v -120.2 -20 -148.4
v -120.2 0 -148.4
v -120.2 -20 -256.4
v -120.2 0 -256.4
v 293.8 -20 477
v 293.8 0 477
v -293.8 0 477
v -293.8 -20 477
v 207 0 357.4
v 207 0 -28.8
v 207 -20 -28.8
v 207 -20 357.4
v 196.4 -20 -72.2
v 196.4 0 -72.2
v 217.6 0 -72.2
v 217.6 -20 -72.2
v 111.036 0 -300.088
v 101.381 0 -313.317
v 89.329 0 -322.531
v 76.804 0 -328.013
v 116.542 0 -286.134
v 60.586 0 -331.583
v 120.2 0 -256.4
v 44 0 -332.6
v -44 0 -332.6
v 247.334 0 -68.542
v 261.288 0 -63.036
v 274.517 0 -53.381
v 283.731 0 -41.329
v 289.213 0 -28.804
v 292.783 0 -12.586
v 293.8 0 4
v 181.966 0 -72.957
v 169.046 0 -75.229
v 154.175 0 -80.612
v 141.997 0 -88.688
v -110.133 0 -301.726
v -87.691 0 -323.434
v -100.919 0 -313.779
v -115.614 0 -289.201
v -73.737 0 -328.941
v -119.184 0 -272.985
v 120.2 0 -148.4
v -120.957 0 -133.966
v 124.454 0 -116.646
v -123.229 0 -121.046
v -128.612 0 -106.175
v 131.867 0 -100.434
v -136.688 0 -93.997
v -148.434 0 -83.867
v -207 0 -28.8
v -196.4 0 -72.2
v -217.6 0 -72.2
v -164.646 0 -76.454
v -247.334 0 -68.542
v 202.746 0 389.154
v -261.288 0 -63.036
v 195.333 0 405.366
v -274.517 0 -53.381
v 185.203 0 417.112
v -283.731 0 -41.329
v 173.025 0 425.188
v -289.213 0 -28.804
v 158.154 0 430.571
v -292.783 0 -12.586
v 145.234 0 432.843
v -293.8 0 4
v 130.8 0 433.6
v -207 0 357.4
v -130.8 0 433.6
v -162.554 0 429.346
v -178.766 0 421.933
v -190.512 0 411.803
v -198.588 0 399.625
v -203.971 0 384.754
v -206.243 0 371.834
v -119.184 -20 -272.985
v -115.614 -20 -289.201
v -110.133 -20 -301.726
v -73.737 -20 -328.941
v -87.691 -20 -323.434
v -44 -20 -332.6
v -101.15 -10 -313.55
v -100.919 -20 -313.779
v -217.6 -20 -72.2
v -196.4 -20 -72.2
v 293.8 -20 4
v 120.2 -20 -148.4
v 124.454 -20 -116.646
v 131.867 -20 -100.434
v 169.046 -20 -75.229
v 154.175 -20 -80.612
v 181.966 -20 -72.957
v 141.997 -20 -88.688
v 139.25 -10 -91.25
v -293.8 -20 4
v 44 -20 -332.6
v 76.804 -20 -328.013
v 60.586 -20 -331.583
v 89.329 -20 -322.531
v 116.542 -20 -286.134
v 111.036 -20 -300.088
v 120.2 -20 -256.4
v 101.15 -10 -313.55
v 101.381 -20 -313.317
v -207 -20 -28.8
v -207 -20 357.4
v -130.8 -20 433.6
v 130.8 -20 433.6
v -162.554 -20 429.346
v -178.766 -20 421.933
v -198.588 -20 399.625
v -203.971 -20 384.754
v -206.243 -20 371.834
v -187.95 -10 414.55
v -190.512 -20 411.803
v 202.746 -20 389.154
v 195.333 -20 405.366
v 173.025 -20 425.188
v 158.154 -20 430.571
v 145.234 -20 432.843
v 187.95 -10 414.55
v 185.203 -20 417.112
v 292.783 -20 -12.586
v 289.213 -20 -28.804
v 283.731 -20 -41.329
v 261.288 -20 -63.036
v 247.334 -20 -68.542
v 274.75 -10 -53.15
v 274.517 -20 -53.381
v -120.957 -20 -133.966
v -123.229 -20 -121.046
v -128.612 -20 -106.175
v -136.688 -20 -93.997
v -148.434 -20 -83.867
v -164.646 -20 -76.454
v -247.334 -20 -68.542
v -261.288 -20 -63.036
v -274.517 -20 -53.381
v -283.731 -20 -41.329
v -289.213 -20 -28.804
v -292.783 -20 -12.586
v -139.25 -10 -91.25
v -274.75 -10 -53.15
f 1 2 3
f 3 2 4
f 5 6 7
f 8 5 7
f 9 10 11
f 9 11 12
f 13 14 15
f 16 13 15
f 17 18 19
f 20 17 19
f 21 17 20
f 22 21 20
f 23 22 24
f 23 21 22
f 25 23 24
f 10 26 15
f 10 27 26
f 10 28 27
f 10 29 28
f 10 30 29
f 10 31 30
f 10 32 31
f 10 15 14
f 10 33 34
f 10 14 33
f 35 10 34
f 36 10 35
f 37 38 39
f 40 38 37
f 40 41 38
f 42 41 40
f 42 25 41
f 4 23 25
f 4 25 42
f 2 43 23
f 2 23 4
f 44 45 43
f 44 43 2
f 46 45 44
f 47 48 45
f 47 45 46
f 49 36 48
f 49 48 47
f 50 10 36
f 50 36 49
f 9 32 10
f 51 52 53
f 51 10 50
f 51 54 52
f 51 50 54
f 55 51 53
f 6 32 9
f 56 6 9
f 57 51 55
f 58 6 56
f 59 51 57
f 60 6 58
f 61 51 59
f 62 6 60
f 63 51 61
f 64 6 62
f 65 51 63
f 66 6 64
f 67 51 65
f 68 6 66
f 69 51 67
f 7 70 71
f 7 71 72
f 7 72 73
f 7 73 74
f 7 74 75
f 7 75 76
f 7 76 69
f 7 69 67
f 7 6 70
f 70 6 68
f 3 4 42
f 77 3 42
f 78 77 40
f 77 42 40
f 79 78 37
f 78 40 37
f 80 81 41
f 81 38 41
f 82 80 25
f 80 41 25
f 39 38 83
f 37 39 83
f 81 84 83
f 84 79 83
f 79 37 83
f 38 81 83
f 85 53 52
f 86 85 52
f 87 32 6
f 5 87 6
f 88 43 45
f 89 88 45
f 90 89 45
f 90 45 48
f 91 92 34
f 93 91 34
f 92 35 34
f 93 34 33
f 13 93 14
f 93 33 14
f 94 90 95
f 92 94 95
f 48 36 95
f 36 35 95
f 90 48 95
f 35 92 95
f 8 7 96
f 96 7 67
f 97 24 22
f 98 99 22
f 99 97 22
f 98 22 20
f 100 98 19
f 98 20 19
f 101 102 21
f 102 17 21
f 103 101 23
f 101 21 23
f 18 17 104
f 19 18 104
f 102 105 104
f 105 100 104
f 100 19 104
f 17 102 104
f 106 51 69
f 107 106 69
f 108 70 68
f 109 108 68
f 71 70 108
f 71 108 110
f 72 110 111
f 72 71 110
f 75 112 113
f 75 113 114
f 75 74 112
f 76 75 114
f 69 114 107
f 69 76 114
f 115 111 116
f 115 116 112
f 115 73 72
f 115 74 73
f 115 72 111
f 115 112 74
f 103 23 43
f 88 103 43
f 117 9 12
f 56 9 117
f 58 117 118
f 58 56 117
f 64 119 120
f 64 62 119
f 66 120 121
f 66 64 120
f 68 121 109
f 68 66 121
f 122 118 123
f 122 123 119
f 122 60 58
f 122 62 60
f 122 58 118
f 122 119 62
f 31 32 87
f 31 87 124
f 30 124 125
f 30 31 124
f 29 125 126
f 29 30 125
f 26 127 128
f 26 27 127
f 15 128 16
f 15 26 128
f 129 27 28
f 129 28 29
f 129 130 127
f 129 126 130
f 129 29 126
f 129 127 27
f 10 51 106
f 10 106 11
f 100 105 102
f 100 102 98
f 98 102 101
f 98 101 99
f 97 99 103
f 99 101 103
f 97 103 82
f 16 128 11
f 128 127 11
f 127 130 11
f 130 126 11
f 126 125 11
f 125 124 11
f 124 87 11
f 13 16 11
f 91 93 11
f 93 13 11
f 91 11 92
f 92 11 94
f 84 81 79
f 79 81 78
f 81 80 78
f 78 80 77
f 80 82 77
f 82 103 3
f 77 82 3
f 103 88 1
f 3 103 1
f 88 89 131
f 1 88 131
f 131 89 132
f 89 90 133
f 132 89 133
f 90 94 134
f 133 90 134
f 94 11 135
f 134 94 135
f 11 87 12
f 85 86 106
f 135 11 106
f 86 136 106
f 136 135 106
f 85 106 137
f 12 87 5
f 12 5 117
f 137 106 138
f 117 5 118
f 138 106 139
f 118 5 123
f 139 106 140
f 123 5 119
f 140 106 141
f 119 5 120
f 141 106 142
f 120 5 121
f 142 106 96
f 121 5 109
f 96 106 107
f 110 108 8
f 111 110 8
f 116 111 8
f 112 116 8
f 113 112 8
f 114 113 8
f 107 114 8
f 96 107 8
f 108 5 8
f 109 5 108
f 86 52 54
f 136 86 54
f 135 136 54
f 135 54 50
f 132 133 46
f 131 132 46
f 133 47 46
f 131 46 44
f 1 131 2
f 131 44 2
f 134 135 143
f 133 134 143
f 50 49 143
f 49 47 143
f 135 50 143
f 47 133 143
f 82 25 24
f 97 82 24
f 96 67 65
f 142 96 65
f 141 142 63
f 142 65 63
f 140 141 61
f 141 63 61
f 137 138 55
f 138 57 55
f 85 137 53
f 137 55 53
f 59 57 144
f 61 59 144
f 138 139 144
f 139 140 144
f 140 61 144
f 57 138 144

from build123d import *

# Parameters (mm, degrees)
F1_DEPTH    = 20
F2_T1_DEPTH = 20
F2_T3_DEPTH = 401
F3_W        = 414
F3_H        = 462.4
F4_DEPTH    = 25.4
F5_T1_DEPTH = 20


# Not quite as in the source:
# - a fillet or chamfer that OpenCascade refuses, or shapes differently, is made with other operations: its cross-section is extruded or revolved along the edge and cut away or added


with BuildPart() as f1:
    # F0 (on Front) → F1 (new body)
    with BuildSketch(Plane.XZ):
        Polygon((293.8, 477), (-293.8, 477), (-293.8, -72.2), (-120.2, -72.2), (-120.2, -332.6), (120.2, -332.6), (120.2, -72.2), (293.8, -72.2), align=None)
    extrude(amount=F1_DEPTH)

    # F2: fillet of radius 76.2 on 6 edges, made by hand

    # F2_s2 → F2_t1 (join)
    with BuildSketch(Plane.XZ):
        with BuildLine():
            add(Edge.make_bspline(
                [(-196.4, -72.2), (-120.2, -72.2), (-120.2, -148.4)],
                knots=[0, 0, 0, 1, 1, 1], degree=2, weights=[1, 1, 1]))
            Line((-120.2, -148.4), (-120.2, -72.2))
            Line((-120.2, -72.2), (-196.4, -72.2))
        make_face()
        with BuildLine():
            add(Edge.make_bspline(
                [(120.2, -148.4), (120.2, -72.2), (196.4, -72.2)],
                knots=[0, 0, 0, 1, 1, 1], degree=2, weights=[1, 1, 1]))
            Line((196.4, -72.2), (120.2, -72.2))
            Line((120.2, -72.2), (120.2, -148.4))
        make_face()
    extrude(amount=F2_T1_DEPTH)

    # F2_s4 → F2_t3 (cut)
    with BuildSketch(Plane.XZ.offset(-190.5)):
        with BuildLine():
            add(Edge.make_bspline(
                [(-293.8, 4), (-293.8, -72.2), (-217.6, -72.2)],
                knots=[0, 0, 0, 1, 1, 1], degree=2, weights=[1, 1, 1]))
            Line((-217.6, -72.2), (-293.8, -72.2))
            Line((-293.8, -72.2), (-293.8, 4))
        make_face()
        with BuildLine():
            add(Edge.make_bspline(
                [(44, -332.6), (120.2, -332.6), (120.2, -256.4)],
                knots=[0, 0, 0, 1, 1, 1], degree=2, weights=[1, 1, 1]))
            Line((120.2, -256.4), (120.2, -332.6))
            Line((120.2, -332.6), (44, -332.6))
        make_face()
        with BuildLine():
            add(Edge.make_bspline(
                [(293.8, 4), (293.8, -72.2), (217.6, -72.2)],
                knots=[0, 0, 0, 1, 1, 1], degree=2, weights=[1, 1, 1]))
            Line((217.6, -72.2), (293.8, -72.2))
            Line((293.8, -72.2), (293.8, 4))
        make_face()
        with BuildLine():
            add(Edge.make_bspline(
                [(-120.2, -256.4), (-120.2, -332.6), (-44, -332.6)],
                knots=[0, 0, 0, 1, 1, 1], degree=2, weights=[1, 1, 1]))
            Line((-44, -332.6), (-120.2, -332.6))
            Line((-120.2, -332.6), (-120.2, -256.4))
        make_face()
    extrude(amount=F2_T3_DEPTH, mode=Mode.SUBTRACT)

    # F3 (on Front) → F4 (cut)
    with BuildSketch(Plane.XZ):
        with Locations((0, 202.4)):
            Rectangle(F3_W, F3_H)
    extrude(amount=F4_DEPTH, mode=Mode.SUBTRACT)

    # F5: fillet of radius 76.2 on 2 edges, made by hand

    # F5_s2 → F5_t1 (join)
    with BuildSketch(Plane.XZ):
        with BuildLine():
            add(Edge.make_bspline(
                [(-130.8, 433.6), (-207, 433.6), (-207, 357.4)],
                knots=[0, 0, 0, 1, 1, 1], degree=2, weights=[1, 1, 1]))
            Line((-207, 357.4), (-207, 433.6))
            Line((-207, 433.6), (-130.8, 433.6))
        make_face()
        with BuildLine():
            add(Edge.make_bspline(
                [(207, 357.4), (207, 433.6), (130.8, 433.6)],
                knots=[0, 0, 0, 1, 1, 1], degree=2, weights=[1, 1, 1]))
            Line((130.8, 433.6), (207, 433.6))
            Line((207, 433.6), (207, 357.4))
        make_face()
    extrude(amount=F5_T1_DEPTH)


solid = f1.part
